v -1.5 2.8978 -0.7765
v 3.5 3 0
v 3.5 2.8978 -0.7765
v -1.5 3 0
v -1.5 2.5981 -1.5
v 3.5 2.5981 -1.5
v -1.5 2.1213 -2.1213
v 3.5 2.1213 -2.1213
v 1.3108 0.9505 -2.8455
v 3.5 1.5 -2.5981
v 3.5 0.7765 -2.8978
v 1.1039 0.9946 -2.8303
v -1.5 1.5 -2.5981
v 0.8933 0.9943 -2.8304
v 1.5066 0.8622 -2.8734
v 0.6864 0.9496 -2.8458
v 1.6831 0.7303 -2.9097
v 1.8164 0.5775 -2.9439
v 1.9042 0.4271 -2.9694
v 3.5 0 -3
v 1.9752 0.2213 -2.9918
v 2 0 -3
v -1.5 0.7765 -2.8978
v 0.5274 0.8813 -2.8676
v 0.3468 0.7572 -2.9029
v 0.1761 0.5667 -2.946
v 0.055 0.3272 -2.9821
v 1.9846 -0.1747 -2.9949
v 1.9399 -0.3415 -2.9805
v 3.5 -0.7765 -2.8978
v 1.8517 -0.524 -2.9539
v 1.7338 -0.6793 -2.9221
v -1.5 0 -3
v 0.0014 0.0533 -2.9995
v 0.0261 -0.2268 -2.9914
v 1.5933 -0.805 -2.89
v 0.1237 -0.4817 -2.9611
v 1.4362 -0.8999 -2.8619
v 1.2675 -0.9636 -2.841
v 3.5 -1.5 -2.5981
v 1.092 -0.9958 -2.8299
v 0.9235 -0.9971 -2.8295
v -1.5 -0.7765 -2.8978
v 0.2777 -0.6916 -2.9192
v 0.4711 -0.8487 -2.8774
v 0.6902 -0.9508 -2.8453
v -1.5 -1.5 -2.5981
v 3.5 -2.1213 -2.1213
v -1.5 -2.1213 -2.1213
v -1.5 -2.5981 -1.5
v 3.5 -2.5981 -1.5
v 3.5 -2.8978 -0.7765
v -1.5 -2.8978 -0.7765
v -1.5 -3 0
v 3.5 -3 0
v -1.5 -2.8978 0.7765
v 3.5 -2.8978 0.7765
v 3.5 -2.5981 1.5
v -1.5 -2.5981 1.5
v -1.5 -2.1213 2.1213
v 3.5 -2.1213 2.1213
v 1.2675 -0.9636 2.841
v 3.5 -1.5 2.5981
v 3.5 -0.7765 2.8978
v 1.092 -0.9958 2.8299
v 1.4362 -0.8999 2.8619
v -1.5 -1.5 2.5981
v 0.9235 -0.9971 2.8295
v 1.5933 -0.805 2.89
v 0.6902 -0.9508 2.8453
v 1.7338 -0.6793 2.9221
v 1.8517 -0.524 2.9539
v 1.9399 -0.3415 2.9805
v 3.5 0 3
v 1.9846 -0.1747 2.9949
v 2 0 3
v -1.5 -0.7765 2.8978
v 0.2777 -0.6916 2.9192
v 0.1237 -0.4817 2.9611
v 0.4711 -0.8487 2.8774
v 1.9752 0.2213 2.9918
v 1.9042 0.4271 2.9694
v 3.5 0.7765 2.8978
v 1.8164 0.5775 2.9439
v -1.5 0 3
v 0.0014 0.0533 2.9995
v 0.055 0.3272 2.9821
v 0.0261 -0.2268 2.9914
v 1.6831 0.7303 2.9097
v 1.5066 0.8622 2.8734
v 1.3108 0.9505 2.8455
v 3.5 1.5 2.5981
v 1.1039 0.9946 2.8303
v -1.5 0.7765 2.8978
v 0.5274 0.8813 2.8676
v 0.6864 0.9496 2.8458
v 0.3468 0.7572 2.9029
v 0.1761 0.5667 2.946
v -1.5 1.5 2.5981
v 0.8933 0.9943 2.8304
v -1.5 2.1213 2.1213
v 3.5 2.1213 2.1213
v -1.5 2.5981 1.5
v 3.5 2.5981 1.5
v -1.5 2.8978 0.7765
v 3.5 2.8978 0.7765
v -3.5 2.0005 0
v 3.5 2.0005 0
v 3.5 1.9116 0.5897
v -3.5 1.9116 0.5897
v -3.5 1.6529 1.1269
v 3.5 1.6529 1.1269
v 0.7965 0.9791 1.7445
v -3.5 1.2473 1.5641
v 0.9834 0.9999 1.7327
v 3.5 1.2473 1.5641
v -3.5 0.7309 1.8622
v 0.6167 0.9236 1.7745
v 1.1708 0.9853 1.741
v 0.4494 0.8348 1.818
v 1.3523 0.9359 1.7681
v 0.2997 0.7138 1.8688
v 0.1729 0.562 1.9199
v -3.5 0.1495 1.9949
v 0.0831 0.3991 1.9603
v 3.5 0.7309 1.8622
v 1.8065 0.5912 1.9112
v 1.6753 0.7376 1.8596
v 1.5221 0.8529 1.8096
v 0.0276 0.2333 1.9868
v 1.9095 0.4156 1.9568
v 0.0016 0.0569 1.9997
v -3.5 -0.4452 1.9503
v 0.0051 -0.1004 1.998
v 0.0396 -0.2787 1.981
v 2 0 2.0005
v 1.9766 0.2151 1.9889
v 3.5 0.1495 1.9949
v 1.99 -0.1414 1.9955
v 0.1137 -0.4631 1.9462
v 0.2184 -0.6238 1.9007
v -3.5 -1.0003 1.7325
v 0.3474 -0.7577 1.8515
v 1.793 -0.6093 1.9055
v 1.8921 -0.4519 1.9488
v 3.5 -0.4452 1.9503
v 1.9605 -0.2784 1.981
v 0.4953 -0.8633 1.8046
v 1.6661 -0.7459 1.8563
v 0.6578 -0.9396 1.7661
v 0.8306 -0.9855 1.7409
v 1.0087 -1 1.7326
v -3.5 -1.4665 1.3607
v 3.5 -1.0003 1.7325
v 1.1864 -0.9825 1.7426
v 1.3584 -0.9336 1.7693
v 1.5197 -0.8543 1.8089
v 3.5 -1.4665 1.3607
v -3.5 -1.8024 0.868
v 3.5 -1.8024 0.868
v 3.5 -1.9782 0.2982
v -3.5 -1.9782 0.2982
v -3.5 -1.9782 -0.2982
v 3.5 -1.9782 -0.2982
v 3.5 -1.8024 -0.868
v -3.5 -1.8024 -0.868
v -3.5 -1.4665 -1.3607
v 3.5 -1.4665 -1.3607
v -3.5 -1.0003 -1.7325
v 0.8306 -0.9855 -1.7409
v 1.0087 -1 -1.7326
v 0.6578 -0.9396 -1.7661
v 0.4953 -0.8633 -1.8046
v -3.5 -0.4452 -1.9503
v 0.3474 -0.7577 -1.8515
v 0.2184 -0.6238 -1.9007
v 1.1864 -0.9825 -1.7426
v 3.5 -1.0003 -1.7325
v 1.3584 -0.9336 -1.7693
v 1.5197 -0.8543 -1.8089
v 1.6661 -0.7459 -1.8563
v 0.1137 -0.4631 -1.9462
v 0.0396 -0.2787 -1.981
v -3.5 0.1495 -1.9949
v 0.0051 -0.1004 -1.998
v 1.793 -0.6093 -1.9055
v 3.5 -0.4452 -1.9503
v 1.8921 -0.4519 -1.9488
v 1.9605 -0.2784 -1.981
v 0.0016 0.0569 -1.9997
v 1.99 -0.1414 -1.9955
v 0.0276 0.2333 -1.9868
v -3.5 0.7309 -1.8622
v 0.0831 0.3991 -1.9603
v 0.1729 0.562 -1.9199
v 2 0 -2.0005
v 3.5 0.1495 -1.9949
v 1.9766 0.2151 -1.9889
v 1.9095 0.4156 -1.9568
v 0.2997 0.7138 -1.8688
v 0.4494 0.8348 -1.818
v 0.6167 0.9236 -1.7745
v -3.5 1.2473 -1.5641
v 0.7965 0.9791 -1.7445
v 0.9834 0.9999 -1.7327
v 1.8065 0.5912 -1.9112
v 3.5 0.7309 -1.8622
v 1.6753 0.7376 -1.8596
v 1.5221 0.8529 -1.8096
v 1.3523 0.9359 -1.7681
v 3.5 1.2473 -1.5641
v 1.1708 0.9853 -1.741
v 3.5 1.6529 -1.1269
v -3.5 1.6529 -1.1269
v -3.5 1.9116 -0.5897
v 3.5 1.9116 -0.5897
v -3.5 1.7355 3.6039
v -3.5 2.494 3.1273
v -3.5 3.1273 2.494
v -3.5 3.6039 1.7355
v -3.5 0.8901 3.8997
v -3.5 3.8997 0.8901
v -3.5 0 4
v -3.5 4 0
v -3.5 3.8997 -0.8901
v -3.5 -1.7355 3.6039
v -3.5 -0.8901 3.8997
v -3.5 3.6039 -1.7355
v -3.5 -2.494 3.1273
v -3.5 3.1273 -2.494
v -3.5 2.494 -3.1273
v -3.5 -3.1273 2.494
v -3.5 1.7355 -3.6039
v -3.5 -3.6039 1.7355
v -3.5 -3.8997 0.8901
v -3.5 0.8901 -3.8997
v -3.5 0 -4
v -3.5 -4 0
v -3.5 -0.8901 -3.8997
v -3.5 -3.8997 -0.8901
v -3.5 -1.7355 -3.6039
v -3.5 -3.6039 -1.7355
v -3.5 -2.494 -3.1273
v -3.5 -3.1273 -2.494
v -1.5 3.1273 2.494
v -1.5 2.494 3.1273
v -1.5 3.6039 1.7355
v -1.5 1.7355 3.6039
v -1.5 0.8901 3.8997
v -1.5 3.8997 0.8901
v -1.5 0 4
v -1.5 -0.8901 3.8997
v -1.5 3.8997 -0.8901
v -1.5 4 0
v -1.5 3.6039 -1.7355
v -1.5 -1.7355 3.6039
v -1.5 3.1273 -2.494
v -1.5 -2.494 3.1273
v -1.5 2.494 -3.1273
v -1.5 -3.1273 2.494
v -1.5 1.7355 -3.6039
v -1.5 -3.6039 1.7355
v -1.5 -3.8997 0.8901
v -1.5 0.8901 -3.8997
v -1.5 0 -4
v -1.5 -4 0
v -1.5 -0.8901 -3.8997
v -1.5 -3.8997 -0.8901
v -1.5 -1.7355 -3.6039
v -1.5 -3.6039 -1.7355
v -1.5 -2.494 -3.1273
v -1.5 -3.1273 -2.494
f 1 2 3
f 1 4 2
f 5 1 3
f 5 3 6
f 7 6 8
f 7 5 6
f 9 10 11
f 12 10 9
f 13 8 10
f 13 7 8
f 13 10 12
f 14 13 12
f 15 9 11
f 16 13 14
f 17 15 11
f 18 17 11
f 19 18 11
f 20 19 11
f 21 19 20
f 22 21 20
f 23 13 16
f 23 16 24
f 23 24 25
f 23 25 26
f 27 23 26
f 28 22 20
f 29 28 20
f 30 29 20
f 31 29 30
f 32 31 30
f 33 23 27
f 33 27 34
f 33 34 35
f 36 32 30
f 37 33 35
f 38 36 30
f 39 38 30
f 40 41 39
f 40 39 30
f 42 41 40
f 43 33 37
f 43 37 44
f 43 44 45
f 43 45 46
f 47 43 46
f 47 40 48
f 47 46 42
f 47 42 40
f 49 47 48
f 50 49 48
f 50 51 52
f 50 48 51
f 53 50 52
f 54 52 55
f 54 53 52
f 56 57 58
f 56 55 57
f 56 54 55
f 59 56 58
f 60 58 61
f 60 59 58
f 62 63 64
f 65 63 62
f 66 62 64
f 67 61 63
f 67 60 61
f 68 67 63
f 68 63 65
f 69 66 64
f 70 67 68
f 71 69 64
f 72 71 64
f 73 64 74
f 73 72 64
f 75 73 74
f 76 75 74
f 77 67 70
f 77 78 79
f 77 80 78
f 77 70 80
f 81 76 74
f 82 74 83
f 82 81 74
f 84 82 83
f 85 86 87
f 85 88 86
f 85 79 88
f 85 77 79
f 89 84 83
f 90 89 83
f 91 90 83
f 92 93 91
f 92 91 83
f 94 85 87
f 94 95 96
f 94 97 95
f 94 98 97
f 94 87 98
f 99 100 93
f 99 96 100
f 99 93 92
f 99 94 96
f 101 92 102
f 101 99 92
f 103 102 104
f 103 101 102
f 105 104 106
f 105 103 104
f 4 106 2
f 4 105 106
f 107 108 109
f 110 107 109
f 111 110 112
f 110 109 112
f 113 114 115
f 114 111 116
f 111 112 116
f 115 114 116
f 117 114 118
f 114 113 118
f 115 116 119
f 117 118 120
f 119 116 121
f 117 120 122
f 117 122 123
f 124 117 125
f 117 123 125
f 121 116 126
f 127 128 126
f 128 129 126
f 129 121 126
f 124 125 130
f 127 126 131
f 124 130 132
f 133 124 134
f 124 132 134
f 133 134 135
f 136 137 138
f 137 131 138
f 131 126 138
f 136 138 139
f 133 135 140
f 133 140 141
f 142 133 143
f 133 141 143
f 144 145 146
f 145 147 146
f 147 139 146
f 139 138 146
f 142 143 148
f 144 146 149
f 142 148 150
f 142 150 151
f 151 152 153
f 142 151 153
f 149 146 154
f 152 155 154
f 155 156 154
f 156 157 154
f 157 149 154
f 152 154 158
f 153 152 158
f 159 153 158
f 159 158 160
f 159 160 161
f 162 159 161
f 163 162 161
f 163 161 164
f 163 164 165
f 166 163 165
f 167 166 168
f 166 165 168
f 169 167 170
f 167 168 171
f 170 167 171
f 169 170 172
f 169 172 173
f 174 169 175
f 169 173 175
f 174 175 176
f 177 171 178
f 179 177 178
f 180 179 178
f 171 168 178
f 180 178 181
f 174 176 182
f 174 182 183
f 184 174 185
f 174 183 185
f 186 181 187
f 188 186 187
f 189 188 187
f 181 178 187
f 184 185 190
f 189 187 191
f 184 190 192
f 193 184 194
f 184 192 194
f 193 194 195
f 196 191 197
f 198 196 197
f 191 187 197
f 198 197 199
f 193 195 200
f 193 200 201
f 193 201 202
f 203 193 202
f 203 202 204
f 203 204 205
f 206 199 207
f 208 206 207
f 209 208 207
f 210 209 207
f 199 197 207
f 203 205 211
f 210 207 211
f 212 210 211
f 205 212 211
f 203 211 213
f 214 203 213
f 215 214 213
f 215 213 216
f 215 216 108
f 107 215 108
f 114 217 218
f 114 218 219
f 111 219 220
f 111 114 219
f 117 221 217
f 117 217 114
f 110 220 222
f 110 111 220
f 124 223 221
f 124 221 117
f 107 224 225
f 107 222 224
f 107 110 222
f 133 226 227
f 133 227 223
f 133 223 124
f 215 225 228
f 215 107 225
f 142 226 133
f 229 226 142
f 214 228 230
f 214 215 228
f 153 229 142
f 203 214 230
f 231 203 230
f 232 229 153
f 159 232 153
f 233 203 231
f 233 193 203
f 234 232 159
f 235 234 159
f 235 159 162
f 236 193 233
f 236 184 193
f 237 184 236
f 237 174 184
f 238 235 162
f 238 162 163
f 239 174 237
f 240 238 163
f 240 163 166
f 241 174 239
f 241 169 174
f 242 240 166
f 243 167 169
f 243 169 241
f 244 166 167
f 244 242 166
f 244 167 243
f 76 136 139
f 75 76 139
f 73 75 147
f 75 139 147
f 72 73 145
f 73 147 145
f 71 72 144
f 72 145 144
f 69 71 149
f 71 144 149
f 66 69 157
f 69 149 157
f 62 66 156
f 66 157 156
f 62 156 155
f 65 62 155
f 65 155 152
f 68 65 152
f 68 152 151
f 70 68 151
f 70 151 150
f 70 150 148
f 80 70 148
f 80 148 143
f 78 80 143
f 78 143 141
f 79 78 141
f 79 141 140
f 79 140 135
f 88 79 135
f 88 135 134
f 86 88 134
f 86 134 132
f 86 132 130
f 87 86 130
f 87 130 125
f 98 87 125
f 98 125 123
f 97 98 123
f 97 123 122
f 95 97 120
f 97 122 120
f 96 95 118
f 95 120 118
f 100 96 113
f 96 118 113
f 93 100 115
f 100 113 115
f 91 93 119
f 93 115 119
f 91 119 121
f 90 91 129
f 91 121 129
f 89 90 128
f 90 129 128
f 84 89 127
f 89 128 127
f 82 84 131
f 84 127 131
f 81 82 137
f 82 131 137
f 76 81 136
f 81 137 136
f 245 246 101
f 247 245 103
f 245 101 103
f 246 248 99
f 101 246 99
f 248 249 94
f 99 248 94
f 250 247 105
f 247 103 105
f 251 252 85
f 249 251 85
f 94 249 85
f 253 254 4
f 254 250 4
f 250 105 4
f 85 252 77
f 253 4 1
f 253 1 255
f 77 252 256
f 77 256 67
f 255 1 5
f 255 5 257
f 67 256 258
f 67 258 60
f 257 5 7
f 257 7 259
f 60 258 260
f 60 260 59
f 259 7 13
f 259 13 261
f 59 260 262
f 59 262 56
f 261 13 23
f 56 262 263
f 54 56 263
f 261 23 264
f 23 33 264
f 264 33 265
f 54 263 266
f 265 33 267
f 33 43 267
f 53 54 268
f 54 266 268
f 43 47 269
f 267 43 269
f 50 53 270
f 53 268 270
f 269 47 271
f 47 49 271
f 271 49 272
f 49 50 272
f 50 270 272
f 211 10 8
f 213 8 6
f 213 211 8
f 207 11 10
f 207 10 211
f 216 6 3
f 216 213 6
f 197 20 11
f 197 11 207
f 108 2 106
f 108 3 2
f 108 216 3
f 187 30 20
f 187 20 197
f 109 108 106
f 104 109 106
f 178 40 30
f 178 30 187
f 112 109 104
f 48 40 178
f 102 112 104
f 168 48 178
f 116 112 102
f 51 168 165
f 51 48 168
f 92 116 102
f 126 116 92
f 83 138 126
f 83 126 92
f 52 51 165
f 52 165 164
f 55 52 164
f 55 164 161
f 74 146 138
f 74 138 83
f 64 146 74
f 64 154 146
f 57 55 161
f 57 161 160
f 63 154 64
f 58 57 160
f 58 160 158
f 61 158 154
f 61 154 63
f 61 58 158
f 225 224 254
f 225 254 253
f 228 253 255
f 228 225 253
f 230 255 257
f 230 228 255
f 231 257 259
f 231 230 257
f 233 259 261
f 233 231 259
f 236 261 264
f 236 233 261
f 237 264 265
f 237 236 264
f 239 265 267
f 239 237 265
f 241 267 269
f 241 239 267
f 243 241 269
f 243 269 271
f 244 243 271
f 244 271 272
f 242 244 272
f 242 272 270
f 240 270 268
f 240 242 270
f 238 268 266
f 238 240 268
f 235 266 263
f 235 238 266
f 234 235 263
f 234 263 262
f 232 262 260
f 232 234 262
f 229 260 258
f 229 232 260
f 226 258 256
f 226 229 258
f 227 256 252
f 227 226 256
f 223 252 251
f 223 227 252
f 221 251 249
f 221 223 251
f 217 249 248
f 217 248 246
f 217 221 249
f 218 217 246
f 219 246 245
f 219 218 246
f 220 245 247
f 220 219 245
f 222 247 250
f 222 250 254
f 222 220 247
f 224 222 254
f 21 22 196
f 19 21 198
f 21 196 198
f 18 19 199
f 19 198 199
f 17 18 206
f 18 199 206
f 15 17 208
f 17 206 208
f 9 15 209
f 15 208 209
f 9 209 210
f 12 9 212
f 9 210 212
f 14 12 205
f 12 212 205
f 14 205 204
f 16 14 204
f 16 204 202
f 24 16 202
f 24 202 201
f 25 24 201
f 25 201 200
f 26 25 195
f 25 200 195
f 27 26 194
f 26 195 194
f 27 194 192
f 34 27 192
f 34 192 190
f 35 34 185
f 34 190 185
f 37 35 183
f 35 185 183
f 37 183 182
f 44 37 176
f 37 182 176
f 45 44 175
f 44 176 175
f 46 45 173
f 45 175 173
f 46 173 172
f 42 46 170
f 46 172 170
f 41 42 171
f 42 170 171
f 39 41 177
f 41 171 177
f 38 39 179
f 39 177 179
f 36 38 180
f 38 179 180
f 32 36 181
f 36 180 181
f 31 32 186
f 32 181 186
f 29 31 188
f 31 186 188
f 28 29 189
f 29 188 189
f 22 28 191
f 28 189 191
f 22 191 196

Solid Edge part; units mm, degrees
sketch "Sketch1" plane through (0, 0, 0) normal (1, 0, 0) x (0, 1, 0)
  circle A0 centre (0, 0) radius 3
extrude "Protrusion1" add sketch "Sketch1" along normal mid plane 7
sketch "Sketch2" plane through (-3.5, 0, 0) normal (-1, 0, 0) x (0, 1, 0)
  circle A0 centre (0, 0) radius 4
extrude "ExtrudedProtrusion_2" add sketch "Sketch2" against normal blind 2
sketch "Sketch3" plane through (3.5, 0, 0) normal (1, 0, 0) x (0, 1, 0)
  circle A0 centre (0, 0) radius 2.0005
extrude "ExtrudedCutout_1" cut sketch "Sketch3" along normal mid plane 52.3532
sketch "Sketch4" plane through (0, 0, 0) normal (0, 0, 1) x (1, 0, 0)
  circle A0 centre (1, 0) radius 1
extrude "ExtrudedCutout_2" cut sketch "Sketch4" along normal mid plane 12.1891
properties material "PVC"
